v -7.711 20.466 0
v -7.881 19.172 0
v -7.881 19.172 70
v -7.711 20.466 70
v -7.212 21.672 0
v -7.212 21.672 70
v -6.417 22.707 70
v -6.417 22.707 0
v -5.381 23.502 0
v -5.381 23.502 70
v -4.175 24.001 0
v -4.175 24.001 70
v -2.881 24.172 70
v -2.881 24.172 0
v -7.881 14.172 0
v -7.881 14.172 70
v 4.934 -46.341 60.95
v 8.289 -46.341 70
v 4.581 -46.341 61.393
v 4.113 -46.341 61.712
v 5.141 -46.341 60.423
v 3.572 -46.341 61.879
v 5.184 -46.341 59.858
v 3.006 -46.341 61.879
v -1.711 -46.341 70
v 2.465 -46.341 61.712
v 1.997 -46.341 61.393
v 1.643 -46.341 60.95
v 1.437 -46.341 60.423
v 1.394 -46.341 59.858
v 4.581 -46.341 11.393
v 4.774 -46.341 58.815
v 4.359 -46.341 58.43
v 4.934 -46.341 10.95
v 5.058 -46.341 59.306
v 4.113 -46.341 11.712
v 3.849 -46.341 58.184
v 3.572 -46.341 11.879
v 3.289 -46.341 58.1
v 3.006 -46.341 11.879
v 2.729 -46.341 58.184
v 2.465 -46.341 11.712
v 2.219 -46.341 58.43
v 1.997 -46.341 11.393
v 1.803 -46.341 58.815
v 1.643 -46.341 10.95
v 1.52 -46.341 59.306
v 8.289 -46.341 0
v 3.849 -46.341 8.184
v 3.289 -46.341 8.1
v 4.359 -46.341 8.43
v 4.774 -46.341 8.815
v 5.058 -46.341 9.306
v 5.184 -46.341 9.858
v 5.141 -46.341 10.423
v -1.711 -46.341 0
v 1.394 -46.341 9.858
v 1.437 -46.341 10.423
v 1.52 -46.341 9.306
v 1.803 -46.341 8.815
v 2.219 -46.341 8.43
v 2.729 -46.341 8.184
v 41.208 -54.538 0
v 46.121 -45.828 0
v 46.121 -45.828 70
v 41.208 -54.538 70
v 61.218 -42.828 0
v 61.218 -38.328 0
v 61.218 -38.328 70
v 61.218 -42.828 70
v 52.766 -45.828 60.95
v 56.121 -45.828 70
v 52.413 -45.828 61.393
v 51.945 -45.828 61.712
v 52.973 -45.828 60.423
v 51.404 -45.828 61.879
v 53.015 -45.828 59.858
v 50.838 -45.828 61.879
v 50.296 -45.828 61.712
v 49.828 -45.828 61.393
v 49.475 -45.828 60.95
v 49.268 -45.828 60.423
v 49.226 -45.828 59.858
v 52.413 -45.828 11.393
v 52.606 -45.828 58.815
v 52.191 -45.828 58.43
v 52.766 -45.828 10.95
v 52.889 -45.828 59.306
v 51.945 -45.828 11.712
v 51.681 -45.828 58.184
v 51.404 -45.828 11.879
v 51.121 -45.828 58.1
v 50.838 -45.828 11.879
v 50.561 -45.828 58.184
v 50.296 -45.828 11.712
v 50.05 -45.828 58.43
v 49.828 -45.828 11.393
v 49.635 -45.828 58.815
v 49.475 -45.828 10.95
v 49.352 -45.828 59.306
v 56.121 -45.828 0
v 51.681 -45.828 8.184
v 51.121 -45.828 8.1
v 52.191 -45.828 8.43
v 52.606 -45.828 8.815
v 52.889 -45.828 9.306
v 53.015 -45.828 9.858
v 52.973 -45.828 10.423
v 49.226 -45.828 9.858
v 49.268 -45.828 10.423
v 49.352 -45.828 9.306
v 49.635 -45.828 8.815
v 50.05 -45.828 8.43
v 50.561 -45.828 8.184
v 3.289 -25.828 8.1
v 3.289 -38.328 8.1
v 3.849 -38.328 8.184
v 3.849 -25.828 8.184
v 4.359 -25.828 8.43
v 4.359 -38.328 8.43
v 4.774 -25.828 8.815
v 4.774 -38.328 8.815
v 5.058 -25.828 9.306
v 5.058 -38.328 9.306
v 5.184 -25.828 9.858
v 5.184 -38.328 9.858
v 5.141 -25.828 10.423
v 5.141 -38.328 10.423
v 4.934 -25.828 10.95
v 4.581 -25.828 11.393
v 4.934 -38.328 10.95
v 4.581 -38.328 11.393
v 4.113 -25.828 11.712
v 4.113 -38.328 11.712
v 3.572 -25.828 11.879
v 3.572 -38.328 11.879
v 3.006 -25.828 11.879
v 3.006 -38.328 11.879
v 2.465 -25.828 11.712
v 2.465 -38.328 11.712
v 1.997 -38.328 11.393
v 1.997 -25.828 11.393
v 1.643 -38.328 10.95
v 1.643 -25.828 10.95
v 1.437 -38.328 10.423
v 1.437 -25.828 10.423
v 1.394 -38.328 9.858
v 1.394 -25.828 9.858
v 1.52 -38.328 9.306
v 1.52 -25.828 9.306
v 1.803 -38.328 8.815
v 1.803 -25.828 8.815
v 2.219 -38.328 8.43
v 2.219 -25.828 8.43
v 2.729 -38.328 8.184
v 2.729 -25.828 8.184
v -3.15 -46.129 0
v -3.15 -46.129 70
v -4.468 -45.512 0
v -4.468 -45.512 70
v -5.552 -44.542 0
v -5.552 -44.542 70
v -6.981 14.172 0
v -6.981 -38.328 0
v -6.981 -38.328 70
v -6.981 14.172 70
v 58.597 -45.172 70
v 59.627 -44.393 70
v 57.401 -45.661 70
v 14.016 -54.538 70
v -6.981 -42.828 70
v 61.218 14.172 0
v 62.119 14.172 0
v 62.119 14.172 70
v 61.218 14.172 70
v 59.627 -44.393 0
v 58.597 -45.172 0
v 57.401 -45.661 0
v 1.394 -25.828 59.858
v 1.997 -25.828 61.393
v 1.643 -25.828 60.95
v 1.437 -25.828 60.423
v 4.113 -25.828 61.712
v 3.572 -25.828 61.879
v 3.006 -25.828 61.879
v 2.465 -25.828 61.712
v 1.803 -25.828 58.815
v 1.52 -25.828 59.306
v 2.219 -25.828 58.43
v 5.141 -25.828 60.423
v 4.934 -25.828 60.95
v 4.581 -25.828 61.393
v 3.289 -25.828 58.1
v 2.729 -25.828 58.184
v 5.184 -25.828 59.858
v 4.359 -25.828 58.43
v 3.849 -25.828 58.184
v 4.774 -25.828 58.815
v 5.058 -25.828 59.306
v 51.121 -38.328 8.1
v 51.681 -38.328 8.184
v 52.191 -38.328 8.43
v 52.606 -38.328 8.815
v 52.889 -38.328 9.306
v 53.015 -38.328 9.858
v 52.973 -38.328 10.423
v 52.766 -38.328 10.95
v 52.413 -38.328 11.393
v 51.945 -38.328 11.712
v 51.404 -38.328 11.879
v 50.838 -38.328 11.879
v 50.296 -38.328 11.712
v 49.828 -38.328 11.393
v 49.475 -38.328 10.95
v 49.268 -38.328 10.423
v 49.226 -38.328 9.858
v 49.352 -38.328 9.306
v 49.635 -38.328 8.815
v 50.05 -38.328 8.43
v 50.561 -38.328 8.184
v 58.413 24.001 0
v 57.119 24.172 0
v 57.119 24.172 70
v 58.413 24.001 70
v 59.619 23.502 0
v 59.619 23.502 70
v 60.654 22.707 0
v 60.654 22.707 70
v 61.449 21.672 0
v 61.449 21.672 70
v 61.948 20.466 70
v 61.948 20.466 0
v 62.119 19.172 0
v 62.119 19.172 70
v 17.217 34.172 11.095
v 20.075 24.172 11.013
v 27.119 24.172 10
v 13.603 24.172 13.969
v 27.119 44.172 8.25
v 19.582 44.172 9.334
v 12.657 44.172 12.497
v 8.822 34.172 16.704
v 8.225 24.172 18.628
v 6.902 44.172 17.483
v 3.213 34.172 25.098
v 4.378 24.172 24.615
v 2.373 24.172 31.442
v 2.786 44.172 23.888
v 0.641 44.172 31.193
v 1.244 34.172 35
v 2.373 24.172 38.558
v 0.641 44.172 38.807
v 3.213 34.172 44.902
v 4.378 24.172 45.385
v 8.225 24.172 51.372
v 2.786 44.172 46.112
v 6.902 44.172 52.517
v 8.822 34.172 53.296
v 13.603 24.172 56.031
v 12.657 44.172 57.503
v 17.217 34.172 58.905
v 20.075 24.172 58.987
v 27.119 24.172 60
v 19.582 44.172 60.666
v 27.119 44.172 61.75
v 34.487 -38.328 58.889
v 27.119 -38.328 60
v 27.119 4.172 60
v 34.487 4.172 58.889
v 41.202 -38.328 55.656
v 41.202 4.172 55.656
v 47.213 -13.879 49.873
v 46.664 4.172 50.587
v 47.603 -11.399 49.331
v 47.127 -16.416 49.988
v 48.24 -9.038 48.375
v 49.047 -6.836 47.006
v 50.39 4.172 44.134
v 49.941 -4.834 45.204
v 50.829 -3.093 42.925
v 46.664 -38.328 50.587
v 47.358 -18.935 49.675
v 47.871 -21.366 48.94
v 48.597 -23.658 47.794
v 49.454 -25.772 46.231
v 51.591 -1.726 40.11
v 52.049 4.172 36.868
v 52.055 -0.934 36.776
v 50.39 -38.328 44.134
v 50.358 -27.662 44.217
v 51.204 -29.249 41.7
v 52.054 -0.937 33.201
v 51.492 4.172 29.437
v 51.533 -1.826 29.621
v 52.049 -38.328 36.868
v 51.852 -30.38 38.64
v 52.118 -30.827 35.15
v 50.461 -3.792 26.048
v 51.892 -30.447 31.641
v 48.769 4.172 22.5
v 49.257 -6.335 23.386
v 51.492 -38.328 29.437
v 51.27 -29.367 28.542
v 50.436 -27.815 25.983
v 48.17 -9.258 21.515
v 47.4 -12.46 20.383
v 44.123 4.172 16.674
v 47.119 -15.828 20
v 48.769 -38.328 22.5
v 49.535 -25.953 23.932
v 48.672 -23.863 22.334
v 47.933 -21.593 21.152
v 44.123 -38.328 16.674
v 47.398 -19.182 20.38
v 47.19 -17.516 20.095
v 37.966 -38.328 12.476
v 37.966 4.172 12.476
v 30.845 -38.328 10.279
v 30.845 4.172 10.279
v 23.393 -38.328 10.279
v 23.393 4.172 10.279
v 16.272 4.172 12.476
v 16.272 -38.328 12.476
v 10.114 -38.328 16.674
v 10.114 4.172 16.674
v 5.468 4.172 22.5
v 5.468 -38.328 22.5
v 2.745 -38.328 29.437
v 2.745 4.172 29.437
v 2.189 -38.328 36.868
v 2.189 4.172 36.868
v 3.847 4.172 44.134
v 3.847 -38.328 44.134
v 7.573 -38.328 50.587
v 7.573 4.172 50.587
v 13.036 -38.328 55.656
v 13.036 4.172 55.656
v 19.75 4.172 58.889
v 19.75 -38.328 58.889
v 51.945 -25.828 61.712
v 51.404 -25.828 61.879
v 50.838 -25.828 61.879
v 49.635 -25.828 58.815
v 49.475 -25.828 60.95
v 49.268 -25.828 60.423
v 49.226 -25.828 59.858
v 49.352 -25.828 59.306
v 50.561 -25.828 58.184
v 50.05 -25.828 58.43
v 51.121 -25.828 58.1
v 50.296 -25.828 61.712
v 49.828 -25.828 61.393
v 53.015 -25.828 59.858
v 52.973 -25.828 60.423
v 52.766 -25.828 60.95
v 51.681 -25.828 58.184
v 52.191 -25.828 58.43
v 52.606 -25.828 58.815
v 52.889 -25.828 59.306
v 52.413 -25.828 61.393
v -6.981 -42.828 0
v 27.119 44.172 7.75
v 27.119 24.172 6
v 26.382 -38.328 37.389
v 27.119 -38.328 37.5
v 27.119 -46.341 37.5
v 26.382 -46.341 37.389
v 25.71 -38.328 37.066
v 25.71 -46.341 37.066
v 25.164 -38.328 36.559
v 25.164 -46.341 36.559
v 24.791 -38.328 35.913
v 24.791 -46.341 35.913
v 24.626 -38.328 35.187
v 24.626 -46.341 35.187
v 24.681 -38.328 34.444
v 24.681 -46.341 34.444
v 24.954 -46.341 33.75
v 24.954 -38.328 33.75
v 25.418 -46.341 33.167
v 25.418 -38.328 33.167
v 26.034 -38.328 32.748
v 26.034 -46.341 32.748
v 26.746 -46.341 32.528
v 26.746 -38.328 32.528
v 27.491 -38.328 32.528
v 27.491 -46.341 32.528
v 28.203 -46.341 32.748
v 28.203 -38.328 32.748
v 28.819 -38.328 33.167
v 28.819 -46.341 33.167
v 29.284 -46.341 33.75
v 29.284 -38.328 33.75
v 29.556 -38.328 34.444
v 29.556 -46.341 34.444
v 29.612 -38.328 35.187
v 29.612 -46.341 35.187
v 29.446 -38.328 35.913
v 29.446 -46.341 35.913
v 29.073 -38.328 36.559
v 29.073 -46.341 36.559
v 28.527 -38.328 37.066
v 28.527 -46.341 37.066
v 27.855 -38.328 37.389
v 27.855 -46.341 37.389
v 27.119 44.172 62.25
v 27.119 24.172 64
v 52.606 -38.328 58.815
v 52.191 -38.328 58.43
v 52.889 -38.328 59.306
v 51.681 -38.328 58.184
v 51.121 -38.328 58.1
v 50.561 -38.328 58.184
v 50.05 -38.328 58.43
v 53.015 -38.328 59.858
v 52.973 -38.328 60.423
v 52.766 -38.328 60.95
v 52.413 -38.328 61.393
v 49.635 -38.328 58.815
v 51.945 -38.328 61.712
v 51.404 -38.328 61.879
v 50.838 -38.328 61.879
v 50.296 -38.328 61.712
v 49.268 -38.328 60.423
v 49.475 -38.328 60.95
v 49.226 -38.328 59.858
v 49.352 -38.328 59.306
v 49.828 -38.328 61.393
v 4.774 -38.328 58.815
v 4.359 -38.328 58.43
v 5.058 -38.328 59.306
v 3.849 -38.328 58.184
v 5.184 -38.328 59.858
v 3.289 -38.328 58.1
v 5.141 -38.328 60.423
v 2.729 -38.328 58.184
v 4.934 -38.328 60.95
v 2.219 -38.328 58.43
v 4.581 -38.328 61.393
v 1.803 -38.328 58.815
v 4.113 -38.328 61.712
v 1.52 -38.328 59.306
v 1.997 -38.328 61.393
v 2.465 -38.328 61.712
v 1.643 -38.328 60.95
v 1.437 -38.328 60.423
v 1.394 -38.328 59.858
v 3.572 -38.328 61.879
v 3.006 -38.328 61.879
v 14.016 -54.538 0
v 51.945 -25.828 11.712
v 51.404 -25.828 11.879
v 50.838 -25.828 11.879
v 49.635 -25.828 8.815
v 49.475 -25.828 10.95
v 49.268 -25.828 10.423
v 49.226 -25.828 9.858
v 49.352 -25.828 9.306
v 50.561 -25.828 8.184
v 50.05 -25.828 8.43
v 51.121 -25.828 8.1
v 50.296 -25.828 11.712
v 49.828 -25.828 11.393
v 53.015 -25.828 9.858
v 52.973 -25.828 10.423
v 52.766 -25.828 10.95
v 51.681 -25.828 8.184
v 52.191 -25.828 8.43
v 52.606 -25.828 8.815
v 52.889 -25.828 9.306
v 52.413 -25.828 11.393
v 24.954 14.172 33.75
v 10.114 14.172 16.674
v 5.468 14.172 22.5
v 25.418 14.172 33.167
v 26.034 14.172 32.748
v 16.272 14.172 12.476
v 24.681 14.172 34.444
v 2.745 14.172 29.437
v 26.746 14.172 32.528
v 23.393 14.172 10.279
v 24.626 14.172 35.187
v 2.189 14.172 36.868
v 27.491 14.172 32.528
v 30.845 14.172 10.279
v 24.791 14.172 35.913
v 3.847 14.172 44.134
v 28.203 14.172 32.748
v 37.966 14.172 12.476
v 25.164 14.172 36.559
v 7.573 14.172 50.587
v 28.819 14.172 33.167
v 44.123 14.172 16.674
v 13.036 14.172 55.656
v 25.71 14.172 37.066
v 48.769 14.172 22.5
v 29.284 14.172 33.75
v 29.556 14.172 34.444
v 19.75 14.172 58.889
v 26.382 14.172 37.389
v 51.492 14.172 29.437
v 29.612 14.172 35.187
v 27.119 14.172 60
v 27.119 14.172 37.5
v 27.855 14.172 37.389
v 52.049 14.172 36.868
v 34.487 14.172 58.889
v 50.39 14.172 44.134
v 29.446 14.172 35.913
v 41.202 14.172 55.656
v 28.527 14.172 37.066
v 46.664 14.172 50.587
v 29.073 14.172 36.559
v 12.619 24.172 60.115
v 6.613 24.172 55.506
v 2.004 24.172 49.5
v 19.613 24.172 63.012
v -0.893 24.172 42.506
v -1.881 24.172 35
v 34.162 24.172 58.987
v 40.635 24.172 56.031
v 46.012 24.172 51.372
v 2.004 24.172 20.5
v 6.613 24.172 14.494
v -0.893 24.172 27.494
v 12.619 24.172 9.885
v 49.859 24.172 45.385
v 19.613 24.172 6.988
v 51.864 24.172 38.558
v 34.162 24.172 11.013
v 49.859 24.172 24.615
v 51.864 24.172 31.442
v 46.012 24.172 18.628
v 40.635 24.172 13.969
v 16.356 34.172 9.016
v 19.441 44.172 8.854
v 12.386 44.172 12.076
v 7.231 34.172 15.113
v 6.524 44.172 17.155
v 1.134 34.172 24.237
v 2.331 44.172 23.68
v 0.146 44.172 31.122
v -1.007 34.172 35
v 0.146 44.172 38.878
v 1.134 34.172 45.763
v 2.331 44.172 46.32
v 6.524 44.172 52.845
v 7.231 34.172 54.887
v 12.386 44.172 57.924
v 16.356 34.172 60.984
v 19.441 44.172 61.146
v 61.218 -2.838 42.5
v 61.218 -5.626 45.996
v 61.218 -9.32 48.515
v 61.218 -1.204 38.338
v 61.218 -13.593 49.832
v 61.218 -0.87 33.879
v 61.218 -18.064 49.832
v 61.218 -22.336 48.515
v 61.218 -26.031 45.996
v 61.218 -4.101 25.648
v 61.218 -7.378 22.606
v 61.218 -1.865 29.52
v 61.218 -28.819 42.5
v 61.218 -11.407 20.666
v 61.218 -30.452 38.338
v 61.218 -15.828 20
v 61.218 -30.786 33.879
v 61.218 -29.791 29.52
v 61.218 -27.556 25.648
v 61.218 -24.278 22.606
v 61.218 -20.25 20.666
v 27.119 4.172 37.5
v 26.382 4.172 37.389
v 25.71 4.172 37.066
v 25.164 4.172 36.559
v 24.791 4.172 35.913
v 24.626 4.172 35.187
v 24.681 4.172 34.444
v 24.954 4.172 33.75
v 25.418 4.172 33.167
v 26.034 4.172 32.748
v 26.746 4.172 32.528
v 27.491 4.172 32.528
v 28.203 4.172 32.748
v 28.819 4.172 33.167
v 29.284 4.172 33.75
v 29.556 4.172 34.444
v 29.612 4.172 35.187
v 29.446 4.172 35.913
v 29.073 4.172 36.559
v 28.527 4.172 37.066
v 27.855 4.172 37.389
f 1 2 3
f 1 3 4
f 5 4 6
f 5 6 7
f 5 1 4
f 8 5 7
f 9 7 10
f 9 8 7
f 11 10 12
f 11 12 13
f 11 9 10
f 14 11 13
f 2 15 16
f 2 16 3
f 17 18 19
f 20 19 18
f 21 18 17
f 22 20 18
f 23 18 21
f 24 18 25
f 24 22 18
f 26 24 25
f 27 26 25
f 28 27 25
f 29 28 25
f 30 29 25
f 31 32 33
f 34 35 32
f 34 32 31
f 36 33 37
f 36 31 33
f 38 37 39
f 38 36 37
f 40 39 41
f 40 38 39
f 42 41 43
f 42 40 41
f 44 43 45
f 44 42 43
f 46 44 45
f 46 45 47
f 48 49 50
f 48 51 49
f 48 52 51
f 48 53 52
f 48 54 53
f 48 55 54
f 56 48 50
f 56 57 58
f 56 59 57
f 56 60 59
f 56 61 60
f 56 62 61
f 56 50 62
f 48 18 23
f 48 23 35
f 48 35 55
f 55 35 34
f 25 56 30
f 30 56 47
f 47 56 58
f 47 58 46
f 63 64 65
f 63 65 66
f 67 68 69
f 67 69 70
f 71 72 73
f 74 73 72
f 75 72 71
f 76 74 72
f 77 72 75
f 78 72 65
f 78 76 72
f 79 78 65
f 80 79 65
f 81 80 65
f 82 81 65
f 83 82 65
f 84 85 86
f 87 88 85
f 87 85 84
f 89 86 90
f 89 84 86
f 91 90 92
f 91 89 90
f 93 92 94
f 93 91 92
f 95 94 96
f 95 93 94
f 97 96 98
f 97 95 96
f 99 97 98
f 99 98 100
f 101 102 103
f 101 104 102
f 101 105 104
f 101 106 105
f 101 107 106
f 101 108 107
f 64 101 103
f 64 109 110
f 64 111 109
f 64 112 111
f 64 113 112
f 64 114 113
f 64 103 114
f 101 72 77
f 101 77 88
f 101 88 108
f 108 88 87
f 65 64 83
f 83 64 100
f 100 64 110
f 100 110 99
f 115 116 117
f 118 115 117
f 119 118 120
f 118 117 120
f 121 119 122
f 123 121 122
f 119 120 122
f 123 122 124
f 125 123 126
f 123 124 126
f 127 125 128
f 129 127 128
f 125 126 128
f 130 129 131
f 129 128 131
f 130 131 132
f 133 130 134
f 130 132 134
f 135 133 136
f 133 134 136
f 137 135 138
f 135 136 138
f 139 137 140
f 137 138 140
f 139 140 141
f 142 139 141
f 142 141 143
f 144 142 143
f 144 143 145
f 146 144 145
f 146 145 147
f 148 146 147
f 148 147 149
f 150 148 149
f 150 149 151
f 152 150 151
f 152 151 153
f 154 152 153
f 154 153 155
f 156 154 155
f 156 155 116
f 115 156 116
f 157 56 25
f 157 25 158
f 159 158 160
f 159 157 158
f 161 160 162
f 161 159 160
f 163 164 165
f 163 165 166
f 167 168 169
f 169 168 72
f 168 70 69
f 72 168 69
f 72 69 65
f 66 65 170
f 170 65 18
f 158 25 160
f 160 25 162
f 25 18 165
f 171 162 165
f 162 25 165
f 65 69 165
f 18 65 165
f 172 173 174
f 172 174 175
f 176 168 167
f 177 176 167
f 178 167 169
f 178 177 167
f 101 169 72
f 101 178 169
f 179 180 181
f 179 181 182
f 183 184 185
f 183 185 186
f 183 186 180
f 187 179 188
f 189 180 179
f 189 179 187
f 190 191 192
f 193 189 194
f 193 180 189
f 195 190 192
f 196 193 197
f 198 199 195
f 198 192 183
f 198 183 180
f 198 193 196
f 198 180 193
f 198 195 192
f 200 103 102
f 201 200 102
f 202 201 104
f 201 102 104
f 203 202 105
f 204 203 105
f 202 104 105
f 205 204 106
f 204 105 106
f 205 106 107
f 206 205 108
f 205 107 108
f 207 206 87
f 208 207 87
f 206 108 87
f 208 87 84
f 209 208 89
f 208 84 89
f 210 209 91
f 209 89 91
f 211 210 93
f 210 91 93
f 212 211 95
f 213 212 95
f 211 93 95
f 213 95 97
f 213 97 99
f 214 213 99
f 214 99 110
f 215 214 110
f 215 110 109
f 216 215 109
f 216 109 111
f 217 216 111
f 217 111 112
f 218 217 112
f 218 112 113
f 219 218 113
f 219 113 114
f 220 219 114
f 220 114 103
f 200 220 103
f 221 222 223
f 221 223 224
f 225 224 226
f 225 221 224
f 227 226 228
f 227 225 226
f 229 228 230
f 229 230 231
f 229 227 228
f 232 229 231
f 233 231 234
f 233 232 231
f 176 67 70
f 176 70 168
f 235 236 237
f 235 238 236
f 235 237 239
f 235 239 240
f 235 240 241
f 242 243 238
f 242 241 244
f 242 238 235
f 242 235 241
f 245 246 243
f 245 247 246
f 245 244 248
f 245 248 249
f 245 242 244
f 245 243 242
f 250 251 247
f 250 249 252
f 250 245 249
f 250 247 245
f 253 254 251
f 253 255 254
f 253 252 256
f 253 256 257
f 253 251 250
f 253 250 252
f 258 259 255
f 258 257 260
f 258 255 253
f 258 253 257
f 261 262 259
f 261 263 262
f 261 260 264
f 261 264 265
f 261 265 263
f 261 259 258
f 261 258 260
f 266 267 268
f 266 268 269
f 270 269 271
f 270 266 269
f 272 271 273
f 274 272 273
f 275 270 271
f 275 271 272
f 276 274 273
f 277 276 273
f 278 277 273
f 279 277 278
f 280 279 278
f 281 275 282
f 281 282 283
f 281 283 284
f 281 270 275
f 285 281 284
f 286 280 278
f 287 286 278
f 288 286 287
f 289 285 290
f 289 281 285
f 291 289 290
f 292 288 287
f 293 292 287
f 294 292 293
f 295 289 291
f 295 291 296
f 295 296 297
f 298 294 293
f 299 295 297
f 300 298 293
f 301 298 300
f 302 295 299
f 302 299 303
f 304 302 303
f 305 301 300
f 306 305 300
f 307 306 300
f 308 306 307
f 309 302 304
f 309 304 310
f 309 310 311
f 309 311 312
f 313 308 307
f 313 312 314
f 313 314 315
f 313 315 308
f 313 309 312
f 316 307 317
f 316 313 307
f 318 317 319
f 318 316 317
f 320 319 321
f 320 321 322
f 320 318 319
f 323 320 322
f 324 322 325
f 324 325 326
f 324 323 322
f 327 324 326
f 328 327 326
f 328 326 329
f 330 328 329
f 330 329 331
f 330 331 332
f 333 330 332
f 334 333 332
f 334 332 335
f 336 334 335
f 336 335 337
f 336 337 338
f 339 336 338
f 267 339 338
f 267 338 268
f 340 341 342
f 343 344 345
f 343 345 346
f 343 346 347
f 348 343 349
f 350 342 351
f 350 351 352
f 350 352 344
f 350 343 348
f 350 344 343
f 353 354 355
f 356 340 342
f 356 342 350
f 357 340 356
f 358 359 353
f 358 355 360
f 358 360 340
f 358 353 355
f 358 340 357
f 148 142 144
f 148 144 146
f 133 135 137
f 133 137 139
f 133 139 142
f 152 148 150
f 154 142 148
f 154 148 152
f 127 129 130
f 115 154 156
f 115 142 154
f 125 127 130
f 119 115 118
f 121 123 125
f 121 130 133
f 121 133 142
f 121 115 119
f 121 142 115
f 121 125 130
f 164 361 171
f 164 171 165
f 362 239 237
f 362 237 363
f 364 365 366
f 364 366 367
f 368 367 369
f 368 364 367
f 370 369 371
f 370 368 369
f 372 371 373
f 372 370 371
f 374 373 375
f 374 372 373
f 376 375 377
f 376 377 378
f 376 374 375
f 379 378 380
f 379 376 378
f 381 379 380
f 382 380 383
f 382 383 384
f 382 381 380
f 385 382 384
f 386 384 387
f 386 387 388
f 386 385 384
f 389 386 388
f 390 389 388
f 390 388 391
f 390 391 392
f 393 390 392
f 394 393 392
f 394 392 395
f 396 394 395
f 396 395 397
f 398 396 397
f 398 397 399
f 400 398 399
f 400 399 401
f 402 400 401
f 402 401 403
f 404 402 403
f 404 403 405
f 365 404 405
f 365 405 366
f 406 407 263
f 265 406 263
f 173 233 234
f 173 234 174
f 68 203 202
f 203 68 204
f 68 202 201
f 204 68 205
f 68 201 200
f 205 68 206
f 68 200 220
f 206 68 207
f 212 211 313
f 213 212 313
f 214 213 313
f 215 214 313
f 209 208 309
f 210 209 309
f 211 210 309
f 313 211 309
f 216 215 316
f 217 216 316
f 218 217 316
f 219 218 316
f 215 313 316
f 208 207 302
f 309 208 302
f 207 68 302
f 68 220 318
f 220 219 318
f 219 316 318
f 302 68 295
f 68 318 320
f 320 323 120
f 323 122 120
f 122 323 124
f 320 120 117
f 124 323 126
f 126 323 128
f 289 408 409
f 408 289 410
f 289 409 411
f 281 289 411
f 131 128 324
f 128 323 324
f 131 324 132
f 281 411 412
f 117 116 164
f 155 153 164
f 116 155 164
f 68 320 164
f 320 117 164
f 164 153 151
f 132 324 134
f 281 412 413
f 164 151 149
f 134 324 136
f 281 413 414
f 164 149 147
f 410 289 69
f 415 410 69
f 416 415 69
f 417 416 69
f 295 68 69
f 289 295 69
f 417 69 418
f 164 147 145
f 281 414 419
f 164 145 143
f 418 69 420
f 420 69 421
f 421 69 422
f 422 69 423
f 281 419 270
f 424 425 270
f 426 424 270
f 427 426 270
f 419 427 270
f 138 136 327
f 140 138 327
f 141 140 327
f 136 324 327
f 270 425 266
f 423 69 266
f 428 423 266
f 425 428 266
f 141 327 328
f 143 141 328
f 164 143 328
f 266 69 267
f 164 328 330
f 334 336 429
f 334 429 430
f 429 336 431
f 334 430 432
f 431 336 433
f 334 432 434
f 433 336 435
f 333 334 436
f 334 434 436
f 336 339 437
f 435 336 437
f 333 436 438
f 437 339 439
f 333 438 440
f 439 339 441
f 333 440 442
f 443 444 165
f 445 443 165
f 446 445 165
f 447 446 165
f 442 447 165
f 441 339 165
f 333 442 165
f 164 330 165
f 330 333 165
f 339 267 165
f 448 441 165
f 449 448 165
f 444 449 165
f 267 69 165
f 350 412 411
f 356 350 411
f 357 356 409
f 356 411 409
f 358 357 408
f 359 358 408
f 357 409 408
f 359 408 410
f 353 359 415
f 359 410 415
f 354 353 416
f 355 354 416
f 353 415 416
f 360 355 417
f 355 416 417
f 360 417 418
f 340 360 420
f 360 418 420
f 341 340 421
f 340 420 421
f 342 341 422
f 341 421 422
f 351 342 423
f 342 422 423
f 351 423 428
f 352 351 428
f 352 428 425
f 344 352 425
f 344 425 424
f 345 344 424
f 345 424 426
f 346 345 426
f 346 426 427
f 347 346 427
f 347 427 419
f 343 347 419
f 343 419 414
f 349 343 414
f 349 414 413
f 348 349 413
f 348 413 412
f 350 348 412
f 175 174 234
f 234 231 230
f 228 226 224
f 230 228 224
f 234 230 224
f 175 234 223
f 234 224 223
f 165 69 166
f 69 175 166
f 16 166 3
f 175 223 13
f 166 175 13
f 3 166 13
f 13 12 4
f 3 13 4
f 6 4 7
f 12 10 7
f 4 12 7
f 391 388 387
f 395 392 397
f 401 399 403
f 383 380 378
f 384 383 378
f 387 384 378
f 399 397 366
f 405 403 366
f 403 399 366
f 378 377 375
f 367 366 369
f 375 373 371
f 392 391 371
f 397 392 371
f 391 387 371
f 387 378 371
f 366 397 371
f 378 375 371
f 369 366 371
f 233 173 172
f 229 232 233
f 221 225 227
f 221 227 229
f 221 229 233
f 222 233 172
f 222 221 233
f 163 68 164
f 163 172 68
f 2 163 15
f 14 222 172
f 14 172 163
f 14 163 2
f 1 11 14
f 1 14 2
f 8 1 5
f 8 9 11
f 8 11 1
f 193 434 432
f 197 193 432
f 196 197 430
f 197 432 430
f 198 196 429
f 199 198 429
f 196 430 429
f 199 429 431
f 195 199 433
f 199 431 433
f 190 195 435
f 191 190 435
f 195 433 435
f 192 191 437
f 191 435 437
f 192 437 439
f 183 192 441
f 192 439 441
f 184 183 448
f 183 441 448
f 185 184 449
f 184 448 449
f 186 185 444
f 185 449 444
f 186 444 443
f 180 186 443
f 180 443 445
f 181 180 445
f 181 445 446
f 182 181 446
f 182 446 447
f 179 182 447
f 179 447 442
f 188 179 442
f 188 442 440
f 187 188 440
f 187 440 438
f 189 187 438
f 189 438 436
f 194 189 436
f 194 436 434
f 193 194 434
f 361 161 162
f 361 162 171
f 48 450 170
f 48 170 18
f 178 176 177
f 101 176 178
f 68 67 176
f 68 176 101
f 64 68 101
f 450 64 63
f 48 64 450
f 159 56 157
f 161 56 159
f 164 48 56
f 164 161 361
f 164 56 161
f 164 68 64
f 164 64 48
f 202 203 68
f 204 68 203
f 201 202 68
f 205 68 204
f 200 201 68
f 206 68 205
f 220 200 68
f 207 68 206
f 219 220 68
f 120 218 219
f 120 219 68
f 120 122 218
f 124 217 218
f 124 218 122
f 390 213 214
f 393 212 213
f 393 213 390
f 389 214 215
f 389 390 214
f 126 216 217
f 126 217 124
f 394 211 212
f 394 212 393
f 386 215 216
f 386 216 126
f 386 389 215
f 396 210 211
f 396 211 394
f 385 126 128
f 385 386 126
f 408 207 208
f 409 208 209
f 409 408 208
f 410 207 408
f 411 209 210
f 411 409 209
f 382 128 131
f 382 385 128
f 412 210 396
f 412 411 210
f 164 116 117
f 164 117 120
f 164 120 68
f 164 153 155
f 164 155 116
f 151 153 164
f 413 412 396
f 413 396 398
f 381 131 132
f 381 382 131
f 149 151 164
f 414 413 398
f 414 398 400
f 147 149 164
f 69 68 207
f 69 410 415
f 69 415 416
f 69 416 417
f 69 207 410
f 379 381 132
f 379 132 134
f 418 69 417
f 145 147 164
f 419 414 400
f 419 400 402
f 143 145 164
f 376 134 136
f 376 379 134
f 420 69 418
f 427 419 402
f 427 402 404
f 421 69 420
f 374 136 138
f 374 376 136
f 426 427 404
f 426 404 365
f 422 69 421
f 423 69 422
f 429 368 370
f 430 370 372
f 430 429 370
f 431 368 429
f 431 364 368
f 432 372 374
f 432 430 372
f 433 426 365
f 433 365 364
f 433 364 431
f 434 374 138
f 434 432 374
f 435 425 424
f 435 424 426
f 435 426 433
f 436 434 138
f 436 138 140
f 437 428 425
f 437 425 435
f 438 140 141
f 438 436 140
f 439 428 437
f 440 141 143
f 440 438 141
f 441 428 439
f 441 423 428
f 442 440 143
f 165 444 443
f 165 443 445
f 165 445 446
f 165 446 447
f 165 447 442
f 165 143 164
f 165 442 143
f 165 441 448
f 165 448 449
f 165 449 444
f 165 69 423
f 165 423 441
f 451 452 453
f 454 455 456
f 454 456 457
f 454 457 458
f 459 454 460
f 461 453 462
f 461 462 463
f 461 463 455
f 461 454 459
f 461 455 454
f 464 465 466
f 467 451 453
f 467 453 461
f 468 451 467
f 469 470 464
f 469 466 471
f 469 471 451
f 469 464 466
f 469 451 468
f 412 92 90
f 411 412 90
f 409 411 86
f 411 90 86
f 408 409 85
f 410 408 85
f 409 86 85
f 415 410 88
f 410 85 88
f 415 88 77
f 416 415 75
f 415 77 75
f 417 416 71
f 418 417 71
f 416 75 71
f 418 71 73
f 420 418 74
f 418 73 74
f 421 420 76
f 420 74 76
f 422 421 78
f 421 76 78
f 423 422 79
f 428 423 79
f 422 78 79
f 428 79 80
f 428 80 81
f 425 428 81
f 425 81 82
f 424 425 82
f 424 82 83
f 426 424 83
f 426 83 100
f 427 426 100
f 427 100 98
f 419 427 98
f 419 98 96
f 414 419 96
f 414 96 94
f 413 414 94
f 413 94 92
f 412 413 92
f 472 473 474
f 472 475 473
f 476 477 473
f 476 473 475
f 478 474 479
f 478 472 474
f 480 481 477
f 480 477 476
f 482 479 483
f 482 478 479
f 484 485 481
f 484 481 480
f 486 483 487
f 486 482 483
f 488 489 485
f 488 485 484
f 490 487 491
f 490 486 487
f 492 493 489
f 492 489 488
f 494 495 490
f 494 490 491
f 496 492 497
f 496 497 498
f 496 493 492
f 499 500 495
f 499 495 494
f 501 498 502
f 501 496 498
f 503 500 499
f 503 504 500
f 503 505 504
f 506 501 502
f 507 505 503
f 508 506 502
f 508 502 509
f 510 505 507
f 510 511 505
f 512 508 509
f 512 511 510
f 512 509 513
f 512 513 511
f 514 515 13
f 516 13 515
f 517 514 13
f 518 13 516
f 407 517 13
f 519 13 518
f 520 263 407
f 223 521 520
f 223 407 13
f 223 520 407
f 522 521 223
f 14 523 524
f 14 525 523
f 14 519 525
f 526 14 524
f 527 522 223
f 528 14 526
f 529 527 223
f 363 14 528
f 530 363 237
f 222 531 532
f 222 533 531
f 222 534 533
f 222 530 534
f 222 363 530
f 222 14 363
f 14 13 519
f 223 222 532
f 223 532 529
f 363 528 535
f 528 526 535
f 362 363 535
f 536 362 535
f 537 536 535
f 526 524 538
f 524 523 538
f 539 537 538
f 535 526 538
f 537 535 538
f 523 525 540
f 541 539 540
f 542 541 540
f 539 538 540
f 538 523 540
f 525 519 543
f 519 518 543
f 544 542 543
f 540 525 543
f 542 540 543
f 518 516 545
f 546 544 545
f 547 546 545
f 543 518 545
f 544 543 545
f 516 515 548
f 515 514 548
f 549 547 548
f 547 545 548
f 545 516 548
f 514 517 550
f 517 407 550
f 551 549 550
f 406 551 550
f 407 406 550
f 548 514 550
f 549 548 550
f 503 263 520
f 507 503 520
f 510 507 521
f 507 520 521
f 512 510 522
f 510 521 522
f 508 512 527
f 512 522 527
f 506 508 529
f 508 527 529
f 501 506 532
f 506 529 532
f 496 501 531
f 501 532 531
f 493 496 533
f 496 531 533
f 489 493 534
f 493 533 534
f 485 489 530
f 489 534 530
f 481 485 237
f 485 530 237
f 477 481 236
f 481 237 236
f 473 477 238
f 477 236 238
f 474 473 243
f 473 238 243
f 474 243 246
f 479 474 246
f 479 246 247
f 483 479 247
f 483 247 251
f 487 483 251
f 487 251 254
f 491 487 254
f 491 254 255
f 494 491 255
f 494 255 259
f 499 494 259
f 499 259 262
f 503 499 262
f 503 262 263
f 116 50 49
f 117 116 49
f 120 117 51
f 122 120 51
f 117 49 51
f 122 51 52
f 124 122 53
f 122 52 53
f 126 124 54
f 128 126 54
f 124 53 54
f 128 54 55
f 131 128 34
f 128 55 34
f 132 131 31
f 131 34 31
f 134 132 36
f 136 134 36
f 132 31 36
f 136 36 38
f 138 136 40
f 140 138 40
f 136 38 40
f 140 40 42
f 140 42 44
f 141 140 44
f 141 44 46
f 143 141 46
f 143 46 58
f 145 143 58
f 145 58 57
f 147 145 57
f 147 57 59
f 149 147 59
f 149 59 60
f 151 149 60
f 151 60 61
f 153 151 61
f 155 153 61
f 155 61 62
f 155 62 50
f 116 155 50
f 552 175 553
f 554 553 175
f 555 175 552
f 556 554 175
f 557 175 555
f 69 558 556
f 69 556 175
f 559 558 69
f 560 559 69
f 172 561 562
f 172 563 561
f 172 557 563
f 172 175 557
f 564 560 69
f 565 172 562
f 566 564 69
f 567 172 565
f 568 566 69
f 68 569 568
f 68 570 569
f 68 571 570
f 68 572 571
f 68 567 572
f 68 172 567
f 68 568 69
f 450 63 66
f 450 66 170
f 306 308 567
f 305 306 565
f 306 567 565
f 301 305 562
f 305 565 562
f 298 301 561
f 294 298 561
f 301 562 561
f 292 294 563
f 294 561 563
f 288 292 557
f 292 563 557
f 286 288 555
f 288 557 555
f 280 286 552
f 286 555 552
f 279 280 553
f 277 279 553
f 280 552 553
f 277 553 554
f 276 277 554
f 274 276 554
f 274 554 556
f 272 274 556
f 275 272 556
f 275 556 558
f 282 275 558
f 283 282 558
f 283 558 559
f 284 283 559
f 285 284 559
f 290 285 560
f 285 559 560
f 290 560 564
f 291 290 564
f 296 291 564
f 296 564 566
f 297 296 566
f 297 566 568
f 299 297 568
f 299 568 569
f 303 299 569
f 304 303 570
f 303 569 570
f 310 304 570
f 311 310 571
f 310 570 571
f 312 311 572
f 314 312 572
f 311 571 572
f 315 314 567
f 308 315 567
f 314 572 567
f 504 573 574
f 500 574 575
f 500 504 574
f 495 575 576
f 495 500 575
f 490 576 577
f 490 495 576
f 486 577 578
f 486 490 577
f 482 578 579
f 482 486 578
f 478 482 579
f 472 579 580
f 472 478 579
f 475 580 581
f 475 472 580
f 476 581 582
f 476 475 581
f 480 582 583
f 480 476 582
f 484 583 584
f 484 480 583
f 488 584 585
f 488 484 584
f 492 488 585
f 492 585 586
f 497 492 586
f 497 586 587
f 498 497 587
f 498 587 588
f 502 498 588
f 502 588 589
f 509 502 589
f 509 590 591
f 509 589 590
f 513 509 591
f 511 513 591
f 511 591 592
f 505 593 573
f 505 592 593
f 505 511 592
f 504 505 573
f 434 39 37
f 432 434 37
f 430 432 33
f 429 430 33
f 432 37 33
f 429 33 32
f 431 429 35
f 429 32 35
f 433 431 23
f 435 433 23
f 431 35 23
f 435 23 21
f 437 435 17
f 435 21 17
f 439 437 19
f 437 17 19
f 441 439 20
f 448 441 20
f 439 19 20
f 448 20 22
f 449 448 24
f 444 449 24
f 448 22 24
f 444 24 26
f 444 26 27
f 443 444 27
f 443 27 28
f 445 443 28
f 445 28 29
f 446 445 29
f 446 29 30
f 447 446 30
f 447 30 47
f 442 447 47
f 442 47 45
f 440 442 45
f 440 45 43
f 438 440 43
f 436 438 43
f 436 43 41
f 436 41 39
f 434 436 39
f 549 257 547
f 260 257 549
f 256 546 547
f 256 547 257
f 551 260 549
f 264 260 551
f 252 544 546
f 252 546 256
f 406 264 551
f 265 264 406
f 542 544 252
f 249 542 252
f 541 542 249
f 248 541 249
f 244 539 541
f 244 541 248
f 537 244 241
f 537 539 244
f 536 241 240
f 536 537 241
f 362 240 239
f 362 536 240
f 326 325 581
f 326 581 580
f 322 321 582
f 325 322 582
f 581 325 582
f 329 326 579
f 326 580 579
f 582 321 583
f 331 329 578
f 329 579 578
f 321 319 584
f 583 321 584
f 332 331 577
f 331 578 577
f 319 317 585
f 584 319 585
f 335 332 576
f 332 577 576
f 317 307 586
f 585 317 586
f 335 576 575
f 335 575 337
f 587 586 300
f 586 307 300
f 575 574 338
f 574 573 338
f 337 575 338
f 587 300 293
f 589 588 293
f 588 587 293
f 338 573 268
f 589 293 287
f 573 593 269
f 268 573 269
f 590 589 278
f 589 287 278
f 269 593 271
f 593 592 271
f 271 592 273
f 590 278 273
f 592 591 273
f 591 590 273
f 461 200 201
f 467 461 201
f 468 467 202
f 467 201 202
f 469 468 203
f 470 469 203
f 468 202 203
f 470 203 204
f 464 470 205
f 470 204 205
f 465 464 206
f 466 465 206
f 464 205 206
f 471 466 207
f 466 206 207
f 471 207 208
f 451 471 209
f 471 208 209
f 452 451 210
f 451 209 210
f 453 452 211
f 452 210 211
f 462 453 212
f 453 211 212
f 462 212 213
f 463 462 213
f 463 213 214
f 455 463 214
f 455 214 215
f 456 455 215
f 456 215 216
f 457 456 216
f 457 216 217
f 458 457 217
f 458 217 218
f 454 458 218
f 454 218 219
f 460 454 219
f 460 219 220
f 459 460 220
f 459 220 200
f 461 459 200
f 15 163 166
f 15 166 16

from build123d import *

# Parameters (mm, degrees)
BOSS_EXTRUDE1_DEPTH    = 70
SKETCH4_R              = 29
SKETCH4_R_2            = 25
EXTRUDE_THIN1_DEPTH    = 20
EXTRUDE_THIN1_DRAFT    = 5
SKETCH5_W              = 30
SKETCH5_H              = 70
CUT_EXTRUDE1_DEPTH     = 20
SKETCH7_R              = 25
CUT_EXTRUDE2_DEPTH     = 10
CUT_EXTRUDE3_START     = -68.710206
SKETCH8_R              = 2.5
CUT_EXTRUDE3_DEPTH     = 60.512739
SKETCH10_R             = 15
CUT_EXTRUDE4_DEPTH     = 30
SPLIT3_SURFACE_1_BACK  = 140.799
SPLIT3_SURFACE_1_DEPTH = 281.598
SPLIT3_SURFACE_2_BACK  = 140.799
SPLIT3_SURFACE_2_DEPTH = 281.598
SKETCH14_R             = 1.9
CUT_EXTRUDE5_DEPTH     = 20
SKETCH17_R             = 1.9
CUT_EXTRUDE7_DEPTH     = 20
CUT_EXTRUDE8_START     = -52.5
SKETCH19_R             = 25
CUT_EXTRUDE8_DEPTH     = 42.5


with BuildPart() as part:
    # Sketch1 → Boss-Extrude1 (new body)
    with BuildSketch(Plane.XY):
        with BuildLine():
            ThreePointArc((-1.711084805, -46.340962164), (-3.831514412, -45.869071955), (-5.551700031, -44.542473477))
            Line((-5.551700031, -44.542473477), (-6.980687822, -42.828223009))
            Line((-6.980687822, -42.828223009), (-6.980687822, 14.171776991))
            Line((-6.980687822, 14.171776991), (-7.881398643, 14.171776991))
            Line((-7.881398643, 14.171776991), (-7.881398643, 19.171776991))
            ThreePointArc((-7.881398643, 19.171776991), (-6.416932549, 22.707310897), (-2.881398643, 24.171776991))
            Line((-2.881398643, 24.171776991), (57.118601357, 24.171776991))
            ThreePointArc((57.118601357, 24.171776991), (60.654135263, 22.707310897), (62.118601357, 19.171776991))
            Line((62.118601357, 19.171776991), (62.118601357, 14.171776991))
            Line((62.118601357, 14.171776991), (61.217890536, 14.171776991))
            Line((61.217890536, 14.171776991), (61.217890536, -42.828223009))
            Line((61.217890536, -42.828223009), (59.626717013, -44.393096038))
            ThreePointArc((59.626717013, -44.393096038), (58.014921228, -45.45555297), (56.120767742, -45.828223009))
            Line((56.120767742, -45.828223009), (46.120767742, -45.828223009))
            Line((46.120767742, -45.828223009), (41.208302807, -54.538428992))
            Line((41.208302807, -54.538428992), (14.016177857, -54.538428992))
            Line((14.016177857, -54.538428992), (8.288915195, -46.340962164))
            Line((8.288915195, -46.340962164), (-1.711084805, -46.340962164))
        make_face()
    extrude(amount=BOSS_EXTRUDE1_DEPTH)


with BuildPart() as extrude_thin1_tool:
    # Sketch4 → Extrude-Thin1 (with draft: the straight prism first)
    with BuildSketch(Plane(origin=(0, 24.171776991, 0), x_dir=(1, 0, 0), z_dir=(0, 1, 0))):
        with Locations((27.118601357, -35)):
            Circle(SKETCH4_R)
        with Locations((27.118601357, -35)):
            Circle(SKETCH4_R_2, mode=Mode.SUBTRACT)
    extrude(amount=EXTRUDE_THIN1_DEPTH)
    # Extrude-Thin1: the draft: its side faces are tilted about the plane it starts from
    extrude_thin1_sides = [extrude_thin1_tool.faces().sort_by_distance(p)[0] for p in [
        (-1.881398643, 34.171776991, 35),
        (2.118601357, 34.171776991, 35),
    ]]
    draft(extrude_thin1_sides, Plane(origin=(0, 24.171776991, 0), x_dir=(1, 0, 0), z_dir=(0, 1, 0)), EXTRUDE_THIN1_DRAFT)


with BuildPart() as part_1:
    add(part.part)

    # Extrude-Thin1: add extrude_thin1_tool
    add(extrude_thin1_tool.part)

    # Sketch5 → Cut-Extrude1 (cut)
    with BuildSketch(Plane(origin=(0, 44.171776991, 0), x_dir=(1, 0, 0), z_dir=(0, 1, 0))):
        with Locations((42.118601357, -35)):
            Rectangle(SKETCH5_W, SKETCH5_H)
    extrude(amount=-CUT_EXTRUDE1_DEPTH, mode=Mode.SUBTRACT)

    # Sketch7 → Cut-Extrude2 (cut)
    with BuildSketch(Plane(origin=(0, 24.171776991, 0), x_dir=(1, 0, 0), z_dir=(0, 1, 0))):
        with Locations(Location((27.118601357, -35, 0), (0, 0, 270))):
            Circle(SKETCH7_R)
    extrude(amount=-CUT_EXTRUDE2_DEPTH, mode=Mode.SUBTRACT)

    # Sketch8 → Cut-Extrude3 (cut)
    with BuildSketch(Plane.XZ.offset(54.538428992).offset(CUT_EXTRUDE3_START)):
        with Locations(Location((27.118601357, 35, 0), (0, 0, 90))):
            Circle(SKETCH8_R)
    extrude(amount=CUT_EXTRUDE3_DEPTH, mode=Mode.SUBTRACT)

    # Sketch10 → Cut-Extrude4 (cut)
    with BuildSketch(Plane(origin=(61.217890536, 0, 0), x_dir=(0, 0, -1), z_dir=(1, 0, 0))):
        with Locations((-35, -15.828223009)):
            Circle(SKETCH10_R)
    extrude(amount=-CUT_EXTRUDE4_DEPTH, mode=Mode.SUBTRACT)


with BuildPart() as body_2:
    # Split3: the piece behind the surface
    add(part_1.part)
    # Split3 surface: a surface, the sketch's curves swept straight by 281.598 mm
    with BuildLine(Plane(origin=(0, 0, 0), x_dir=(-1, 0, 0), z_dir=(0, 0, -1)).offset(-SPLIT3_SURFACE_1_BACK), mode=Mode.PRIVATE) as split3_surface_1_path:
        Line((-61.217890536, -38.328223009), (6.980687822, -38.328223009))
    split3_surface_1 = Shell.extrude(split3_surface_1_path.wire(), (0 * SPLIT3_SURFACE_1_DEPTH, 0 * SPLIT3_SURFACE_1_DEPTH, -1 * SPLIT3_SURFACE_1_DEPTH))
    split(bisect_by=split3_surface_1, keep=Keep.BOTTOM)


with BuildPart() as part_2:
    add(part_1.part)

    # Split3: split by a surface, the side it looks to stays
    # Split3 surface: a surface, the sketch's curves swept straight by 281.598 mm
    with BuildLine(Plane(origin=(0, 0, 0), x_dir=(-1, 0, 0), z_dir=(0, 0, -1)).offset(-SPLIT3_SURFACE_2_BACK), mode=Mode.PRIVATE) as split3_surface_2_path:
        Line((-61.217890536, -38.328223009), (6.980687822, -38.328223009))
    split3_surface_2 = Shell.extrude(split3_surface_2_path.wire(), (0 * SPLIT3_SURFACE_2_DEPTH, 0 * SPLIT3_SURFACE_2_DEPTH, -1 * SPLIT3_SURFACE_2_DEPTH))
    split(bisect_by=split3_surface_2, keep=Keep.TOP)


with BuildPart() as cut_extrude5_tool:
    # Sketch14 → Cut-Extrude5 (new body)
    with BuildSketch(Plane.XZ.offset(45.828223009)):
        with Locations(Location((51.120767742, 60, 0), (0, 0, 270))):
            Circle(SKETCH14_R)
        with Locations(Location((51.120767742, 10, 0), (0, 0, 270))):
            Circle(SKETCH14_R)
        with Locations(Location((3.288915195, 60, 0), (0, 0, 270))):
            Circle(SKETCH14_R)
        with Locations(Location((3.288915195, 10, 0), (0, 0, 270))):
            Circle(SKETCH14_R)
    extrude(amount=-CUT_EXTRUDE5_DEPTH)


with BuildPart() as part_3:
    add(part_2.part)

    # Cut-Extrude5: cut by cut_extrude5_tool
    add(cut_extrude5_tool.part, mode=Mode.SUBTRACT)

    # Sketch19 → Cut-Extrude8 (cut)
    with BuildSketch(Plane(origin=(0, 14.171776991, 0), x_dir=(1, 0, 0), z_dir=(0, 1, 0)).offset(CUT_EXTRUDE8_START)):
        with Locations(Location((27.118601357, -35, 0), (0, 0, 270))):
            Circle(SKETCH19_R)
    extrude(amount=CUT_EXTRUDE8_DEPTH, mode=Mode.SUBTRACT)


with BuildPart() as body_2_1:
    add(body_2.part)

    # Cut-Extrude5: cut by cut_extrude5_tool
    add(cut_extrude5_tool.part, mode=Mode.SUBTRACT)

    # Sketch17 → Cut-Extrude7 (cut)
    with BuildSketch(Plane.XZ.offset(46.340962164)):
        with Locations(Location((3.288915195, 60, 0), (0, 0, 270))):
            Circle(SKETCH17_R)
        with Locations(Location((3.288915195, 10, 0), (0, 0, 270))):
            Circle(SKETCH17_R)
    extrude(amount=-CUT_EXTRUDE7_DEPTH, mode=Mode.SUBTRACT)


solid = Compound([part_3.part, body_2_1.part])
